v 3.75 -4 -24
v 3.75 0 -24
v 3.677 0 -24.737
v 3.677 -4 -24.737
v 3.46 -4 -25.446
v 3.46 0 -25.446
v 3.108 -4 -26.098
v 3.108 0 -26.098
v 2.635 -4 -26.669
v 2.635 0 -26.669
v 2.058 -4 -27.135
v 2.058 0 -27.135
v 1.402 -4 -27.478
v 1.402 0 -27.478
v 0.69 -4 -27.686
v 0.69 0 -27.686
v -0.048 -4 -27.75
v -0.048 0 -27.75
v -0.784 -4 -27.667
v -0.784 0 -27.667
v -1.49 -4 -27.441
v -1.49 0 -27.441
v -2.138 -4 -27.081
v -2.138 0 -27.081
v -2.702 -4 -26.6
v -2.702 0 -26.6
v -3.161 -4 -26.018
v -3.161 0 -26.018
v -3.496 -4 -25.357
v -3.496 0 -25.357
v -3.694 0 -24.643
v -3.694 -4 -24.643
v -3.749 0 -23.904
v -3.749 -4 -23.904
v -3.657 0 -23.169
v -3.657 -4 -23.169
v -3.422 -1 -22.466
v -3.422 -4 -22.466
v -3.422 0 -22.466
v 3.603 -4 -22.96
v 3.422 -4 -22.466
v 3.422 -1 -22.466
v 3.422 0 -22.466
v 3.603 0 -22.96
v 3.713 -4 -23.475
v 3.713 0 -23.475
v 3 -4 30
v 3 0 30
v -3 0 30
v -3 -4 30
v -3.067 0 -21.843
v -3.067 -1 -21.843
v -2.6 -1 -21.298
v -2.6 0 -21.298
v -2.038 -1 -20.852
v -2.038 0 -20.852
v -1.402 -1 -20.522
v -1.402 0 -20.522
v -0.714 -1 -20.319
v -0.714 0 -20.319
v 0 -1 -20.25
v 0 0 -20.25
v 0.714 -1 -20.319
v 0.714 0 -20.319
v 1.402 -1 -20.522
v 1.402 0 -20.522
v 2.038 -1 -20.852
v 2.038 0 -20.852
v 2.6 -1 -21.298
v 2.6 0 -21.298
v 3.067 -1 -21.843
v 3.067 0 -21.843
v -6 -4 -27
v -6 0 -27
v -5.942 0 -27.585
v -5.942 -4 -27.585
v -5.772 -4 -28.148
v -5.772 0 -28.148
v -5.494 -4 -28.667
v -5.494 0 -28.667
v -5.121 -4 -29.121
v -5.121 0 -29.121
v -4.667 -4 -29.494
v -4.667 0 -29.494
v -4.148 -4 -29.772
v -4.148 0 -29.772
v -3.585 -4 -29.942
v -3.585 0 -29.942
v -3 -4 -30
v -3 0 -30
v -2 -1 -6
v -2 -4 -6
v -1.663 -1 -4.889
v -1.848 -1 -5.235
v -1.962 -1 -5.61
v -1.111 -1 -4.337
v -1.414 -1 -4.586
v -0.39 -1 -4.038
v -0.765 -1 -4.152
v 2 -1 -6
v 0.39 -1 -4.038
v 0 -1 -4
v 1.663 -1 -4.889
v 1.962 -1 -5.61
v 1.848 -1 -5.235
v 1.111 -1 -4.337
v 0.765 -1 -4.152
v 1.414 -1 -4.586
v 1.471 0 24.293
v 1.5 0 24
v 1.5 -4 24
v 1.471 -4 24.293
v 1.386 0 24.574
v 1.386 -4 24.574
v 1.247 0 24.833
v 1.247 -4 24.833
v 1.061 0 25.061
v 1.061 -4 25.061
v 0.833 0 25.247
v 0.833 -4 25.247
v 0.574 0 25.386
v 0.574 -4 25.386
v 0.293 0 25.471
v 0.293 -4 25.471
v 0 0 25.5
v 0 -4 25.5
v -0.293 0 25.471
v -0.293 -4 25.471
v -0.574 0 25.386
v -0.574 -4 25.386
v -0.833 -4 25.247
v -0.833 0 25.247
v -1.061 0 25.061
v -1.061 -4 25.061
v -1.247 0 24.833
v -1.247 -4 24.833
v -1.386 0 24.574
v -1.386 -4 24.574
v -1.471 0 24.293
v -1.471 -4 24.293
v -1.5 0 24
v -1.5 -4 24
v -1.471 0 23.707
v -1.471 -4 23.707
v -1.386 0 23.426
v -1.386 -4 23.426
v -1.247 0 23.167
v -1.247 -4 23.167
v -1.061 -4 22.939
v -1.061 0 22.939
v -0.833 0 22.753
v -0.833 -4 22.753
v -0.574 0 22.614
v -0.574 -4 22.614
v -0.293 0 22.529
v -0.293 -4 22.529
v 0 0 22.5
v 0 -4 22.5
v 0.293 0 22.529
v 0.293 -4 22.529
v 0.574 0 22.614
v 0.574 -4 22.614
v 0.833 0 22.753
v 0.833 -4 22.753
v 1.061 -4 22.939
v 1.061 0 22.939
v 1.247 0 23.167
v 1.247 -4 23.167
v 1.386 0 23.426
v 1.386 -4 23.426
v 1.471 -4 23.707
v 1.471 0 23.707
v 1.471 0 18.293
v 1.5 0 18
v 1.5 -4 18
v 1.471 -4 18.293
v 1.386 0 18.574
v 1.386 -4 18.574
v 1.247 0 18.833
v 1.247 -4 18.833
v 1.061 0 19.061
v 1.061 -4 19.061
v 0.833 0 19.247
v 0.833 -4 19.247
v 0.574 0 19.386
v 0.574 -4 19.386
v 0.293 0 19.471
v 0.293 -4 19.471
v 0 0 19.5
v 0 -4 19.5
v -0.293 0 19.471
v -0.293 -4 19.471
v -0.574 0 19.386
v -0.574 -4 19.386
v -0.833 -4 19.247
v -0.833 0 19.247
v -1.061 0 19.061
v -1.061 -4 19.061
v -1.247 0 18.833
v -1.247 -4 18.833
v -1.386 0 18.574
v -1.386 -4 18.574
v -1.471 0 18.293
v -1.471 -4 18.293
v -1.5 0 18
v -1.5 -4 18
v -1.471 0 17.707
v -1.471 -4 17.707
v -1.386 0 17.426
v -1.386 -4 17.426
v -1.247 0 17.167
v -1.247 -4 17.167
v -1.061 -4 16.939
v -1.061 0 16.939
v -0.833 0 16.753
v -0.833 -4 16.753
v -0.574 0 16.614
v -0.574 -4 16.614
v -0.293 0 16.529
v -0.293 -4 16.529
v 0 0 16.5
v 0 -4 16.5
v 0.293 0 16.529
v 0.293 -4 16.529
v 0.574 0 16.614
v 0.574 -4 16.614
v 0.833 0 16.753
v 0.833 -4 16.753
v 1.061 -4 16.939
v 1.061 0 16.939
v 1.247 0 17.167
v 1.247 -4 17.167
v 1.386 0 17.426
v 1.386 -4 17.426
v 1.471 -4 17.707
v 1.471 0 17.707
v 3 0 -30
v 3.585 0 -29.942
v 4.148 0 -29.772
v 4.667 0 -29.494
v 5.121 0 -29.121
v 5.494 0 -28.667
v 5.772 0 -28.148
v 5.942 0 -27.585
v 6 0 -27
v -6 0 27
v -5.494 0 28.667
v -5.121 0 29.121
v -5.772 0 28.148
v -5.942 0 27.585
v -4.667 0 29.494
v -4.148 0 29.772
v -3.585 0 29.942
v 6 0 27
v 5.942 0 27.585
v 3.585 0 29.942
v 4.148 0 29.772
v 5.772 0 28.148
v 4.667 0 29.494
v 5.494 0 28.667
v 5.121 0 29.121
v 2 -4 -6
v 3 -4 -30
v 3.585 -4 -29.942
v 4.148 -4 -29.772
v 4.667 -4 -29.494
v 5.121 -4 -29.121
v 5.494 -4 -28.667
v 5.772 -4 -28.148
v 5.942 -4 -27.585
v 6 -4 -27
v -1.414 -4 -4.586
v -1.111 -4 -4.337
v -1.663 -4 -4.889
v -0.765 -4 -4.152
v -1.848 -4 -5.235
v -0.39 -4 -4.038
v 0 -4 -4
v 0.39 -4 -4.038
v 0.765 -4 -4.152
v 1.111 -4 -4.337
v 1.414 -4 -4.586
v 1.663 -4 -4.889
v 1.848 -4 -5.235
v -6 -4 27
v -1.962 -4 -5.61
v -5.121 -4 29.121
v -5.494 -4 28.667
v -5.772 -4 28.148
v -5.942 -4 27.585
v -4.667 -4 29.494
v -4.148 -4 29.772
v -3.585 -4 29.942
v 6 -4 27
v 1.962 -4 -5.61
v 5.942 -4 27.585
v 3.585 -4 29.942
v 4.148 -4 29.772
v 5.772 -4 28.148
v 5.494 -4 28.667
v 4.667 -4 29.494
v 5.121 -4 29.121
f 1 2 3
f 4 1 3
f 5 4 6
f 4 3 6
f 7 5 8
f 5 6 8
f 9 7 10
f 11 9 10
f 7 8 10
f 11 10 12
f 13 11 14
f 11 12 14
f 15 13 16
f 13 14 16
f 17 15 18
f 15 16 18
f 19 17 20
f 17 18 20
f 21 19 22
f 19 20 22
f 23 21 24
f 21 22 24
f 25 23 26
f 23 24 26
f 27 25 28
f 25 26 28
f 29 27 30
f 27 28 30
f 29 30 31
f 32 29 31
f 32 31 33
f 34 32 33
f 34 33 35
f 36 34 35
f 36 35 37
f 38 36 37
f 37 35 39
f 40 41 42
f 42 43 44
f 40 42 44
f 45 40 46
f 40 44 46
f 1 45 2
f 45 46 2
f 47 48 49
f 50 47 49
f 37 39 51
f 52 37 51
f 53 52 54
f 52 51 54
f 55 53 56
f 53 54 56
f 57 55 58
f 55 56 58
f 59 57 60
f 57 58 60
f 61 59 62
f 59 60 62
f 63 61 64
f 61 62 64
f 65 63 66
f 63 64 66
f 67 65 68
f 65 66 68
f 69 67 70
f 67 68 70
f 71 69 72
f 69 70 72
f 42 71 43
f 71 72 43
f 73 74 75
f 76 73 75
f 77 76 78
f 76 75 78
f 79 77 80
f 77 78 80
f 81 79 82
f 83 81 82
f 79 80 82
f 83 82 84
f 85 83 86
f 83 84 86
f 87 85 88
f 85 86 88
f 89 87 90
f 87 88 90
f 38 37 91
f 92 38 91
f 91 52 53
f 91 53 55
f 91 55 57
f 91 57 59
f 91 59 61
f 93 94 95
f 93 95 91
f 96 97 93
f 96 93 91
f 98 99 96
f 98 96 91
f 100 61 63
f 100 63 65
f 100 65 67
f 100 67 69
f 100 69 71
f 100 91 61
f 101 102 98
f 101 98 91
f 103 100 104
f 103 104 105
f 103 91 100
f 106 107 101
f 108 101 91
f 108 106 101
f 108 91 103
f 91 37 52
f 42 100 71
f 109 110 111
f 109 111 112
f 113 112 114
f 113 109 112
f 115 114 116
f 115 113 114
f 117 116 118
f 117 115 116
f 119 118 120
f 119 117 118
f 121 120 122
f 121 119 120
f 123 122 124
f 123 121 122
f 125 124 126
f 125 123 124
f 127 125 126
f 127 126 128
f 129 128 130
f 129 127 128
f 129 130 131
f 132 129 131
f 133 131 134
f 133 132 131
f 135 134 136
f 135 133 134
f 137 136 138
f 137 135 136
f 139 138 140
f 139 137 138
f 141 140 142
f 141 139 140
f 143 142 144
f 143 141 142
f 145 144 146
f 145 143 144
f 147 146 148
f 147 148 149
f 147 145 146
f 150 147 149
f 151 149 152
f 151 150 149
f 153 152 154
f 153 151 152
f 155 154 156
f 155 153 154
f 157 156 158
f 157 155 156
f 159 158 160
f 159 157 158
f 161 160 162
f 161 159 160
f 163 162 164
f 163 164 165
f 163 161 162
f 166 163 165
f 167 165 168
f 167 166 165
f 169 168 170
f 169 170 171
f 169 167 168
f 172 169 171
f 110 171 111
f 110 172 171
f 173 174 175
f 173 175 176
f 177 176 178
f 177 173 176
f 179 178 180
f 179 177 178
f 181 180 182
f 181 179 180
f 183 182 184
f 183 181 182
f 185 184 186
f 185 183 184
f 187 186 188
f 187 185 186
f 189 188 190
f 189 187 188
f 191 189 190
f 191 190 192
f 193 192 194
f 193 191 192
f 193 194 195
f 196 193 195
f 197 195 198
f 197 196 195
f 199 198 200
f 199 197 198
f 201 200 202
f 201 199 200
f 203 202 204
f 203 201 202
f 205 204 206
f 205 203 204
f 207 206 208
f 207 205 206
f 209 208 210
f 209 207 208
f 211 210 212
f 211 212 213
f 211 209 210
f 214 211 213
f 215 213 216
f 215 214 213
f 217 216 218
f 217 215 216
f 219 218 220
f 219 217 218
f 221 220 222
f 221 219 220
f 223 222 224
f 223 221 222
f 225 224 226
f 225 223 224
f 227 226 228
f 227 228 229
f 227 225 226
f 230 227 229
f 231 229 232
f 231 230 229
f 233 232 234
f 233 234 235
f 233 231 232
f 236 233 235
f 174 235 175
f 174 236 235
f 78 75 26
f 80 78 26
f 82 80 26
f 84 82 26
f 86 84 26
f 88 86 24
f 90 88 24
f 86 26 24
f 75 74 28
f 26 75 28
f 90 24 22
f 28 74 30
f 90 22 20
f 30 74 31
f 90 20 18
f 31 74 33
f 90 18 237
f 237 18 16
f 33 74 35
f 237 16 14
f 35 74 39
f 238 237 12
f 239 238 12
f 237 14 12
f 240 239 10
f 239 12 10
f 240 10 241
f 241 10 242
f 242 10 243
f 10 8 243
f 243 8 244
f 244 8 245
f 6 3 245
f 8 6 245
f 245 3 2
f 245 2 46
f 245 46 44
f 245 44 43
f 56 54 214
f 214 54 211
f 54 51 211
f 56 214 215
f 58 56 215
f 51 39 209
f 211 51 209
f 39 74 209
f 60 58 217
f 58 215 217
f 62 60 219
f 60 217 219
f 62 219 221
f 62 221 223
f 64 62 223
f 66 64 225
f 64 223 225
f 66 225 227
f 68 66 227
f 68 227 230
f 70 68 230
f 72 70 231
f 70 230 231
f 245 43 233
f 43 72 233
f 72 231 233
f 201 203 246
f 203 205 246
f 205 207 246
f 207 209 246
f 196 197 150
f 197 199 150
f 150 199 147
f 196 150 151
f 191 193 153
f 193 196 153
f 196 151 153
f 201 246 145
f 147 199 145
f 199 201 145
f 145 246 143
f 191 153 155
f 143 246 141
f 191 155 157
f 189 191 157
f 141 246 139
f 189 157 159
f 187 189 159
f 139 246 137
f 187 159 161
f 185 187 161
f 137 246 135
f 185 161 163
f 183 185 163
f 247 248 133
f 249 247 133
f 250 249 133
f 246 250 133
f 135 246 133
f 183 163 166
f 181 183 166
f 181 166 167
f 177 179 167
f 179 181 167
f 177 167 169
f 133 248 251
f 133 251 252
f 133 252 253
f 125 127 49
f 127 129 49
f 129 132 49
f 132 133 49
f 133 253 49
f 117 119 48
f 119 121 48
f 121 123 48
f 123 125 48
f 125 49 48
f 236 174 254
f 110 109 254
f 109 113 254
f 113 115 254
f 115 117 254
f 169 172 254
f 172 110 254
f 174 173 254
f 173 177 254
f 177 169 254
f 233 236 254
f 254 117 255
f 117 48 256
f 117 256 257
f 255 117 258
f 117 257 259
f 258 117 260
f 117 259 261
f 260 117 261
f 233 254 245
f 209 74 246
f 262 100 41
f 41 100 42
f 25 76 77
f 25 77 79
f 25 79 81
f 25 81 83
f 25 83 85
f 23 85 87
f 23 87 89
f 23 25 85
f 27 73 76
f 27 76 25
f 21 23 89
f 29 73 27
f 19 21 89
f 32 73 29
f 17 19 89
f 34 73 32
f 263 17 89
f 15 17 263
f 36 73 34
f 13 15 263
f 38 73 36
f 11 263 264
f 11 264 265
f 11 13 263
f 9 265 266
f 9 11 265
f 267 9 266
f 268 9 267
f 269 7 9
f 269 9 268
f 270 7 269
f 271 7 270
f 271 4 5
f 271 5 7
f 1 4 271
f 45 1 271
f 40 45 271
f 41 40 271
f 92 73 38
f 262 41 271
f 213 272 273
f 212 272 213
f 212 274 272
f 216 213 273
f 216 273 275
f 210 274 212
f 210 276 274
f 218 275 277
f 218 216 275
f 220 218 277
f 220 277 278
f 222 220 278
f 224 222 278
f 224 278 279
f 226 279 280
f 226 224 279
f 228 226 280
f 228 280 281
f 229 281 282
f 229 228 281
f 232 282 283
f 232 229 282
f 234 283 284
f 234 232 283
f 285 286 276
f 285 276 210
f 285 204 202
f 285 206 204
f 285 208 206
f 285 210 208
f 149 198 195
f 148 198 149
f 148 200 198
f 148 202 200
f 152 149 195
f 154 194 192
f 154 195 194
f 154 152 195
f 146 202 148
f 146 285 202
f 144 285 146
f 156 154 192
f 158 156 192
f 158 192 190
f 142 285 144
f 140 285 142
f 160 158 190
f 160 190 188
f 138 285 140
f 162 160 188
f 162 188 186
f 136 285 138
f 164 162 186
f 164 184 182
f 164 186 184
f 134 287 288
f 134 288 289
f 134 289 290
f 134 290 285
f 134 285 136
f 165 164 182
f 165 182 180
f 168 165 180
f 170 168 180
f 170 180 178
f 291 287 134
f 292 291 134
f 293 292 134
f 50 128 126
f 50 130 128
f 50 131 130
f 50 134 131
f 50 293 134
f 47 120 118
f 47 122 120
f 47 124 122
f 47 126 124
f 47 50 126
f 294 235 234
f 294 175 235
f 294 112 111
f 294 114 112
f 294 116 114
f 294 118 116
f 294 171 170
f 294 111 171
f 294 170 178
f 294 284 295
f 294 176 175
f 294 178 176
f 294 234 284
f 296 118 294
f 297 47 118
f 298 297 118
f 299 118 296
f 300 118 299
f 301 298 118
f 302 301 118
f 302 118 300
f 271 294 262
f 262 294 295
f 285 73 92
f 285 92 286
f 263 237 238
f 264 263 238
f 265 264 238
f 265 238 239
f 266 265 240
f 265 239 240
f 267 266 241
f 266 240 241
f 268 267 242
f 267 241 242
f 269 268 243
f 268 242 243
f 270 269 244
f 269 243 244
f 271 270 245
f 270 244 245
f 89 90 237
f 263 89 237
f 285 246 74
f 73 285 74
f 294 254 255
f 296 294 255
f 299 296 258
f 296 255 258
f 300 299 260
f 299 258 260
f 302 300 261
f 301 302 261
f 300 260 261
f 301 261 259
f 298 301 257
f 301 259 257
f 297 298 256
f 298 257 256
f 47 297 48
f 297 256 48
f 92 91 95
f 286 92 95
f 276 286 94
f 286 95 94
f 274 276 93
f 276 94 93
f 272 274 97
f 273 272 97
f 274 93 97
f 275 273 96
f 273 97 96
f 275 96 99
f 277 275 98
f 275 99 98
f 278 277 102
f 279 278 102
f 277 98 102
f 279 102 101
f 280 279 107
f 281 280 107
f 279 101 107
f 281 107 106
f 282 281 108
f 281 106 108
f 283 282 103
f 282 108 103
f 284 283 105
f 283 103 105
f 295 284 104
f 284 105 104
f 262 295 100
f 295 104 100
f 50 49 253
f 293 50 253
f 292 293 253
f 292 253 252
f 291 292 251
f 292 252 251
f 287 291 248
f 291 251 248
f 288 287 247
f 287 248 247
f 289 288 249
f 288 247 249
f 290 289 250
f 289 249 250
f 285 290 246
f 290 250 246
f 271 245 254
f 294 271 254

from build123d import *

# Parameters (mm, degrees)
F0_R     = 1.5
F1_DEPTH = 4
F2_DEPTH = 1


with BuildPart() as f1:
    # F0 (on Front) → F1 (new body)
    with BuildSketch(Plane.XZ):
        with BuildLine():
            Line((-3, -30), (3, -30))
            ThreePointArc((3, -30), (5.12132, -29.12132), (6, -27))
            Line((6, -27), (6, 27))
            ThreePointArc((6, 27), (5.12132, 29.12132), (3, 30))
            Line((3, 30), (-3, 30))
            ThreePointArc((-3, 30), (-5.12132, 29.12132), (-6, 27))
            Line((-6, 27), (-6, -27))
            ThreePointArc((-6, -27), (-5.12132, -29.12132), (-3, -30))
        make_face()
        with BuildLine():
            ThreePointArc((3.75, -24), (-0.784385, -27.667048), (-3.421861, -22.465932))
            Line((-3.421861, -22.465932), (-2, -6))
            ThreePointArc((-2, -6), (0, -4), (2, -6))
            Line((2, -6), (3.421861, -22.465932))
            ThreePointArc((3.421861, -22.465932), (3.667048, -23.215615), (3.75, -24))
        make_face(mode=Mode.SUBTRACT)
        with Locations((0, 18)):
            Circle(F0_R, mode=Mode.SUBTRACT)
        with Locations((0, 24)):
            Circle(F0_R, mode=Mode.SUBTRACT)
    extrude(amount=F1_DEPTH)

    # F0 (on Front) → F2 (join)
    with BuildSketch(Plane.XZ):
        with BuildLine():
            Line((-2, -6), (-3.421861, -22.465932))
            ThreePointArc((-3.421861, -22.465932), (0, -20.25), (3.421861, -22.465932))
            Line((3.421861, -22.465932), (2, -6))
            ThreePointArc((2, -6), (0, -4), (-2, -6))
        make_face()
    extrude(amount=F2_DEPTH)


solid = f1.part
